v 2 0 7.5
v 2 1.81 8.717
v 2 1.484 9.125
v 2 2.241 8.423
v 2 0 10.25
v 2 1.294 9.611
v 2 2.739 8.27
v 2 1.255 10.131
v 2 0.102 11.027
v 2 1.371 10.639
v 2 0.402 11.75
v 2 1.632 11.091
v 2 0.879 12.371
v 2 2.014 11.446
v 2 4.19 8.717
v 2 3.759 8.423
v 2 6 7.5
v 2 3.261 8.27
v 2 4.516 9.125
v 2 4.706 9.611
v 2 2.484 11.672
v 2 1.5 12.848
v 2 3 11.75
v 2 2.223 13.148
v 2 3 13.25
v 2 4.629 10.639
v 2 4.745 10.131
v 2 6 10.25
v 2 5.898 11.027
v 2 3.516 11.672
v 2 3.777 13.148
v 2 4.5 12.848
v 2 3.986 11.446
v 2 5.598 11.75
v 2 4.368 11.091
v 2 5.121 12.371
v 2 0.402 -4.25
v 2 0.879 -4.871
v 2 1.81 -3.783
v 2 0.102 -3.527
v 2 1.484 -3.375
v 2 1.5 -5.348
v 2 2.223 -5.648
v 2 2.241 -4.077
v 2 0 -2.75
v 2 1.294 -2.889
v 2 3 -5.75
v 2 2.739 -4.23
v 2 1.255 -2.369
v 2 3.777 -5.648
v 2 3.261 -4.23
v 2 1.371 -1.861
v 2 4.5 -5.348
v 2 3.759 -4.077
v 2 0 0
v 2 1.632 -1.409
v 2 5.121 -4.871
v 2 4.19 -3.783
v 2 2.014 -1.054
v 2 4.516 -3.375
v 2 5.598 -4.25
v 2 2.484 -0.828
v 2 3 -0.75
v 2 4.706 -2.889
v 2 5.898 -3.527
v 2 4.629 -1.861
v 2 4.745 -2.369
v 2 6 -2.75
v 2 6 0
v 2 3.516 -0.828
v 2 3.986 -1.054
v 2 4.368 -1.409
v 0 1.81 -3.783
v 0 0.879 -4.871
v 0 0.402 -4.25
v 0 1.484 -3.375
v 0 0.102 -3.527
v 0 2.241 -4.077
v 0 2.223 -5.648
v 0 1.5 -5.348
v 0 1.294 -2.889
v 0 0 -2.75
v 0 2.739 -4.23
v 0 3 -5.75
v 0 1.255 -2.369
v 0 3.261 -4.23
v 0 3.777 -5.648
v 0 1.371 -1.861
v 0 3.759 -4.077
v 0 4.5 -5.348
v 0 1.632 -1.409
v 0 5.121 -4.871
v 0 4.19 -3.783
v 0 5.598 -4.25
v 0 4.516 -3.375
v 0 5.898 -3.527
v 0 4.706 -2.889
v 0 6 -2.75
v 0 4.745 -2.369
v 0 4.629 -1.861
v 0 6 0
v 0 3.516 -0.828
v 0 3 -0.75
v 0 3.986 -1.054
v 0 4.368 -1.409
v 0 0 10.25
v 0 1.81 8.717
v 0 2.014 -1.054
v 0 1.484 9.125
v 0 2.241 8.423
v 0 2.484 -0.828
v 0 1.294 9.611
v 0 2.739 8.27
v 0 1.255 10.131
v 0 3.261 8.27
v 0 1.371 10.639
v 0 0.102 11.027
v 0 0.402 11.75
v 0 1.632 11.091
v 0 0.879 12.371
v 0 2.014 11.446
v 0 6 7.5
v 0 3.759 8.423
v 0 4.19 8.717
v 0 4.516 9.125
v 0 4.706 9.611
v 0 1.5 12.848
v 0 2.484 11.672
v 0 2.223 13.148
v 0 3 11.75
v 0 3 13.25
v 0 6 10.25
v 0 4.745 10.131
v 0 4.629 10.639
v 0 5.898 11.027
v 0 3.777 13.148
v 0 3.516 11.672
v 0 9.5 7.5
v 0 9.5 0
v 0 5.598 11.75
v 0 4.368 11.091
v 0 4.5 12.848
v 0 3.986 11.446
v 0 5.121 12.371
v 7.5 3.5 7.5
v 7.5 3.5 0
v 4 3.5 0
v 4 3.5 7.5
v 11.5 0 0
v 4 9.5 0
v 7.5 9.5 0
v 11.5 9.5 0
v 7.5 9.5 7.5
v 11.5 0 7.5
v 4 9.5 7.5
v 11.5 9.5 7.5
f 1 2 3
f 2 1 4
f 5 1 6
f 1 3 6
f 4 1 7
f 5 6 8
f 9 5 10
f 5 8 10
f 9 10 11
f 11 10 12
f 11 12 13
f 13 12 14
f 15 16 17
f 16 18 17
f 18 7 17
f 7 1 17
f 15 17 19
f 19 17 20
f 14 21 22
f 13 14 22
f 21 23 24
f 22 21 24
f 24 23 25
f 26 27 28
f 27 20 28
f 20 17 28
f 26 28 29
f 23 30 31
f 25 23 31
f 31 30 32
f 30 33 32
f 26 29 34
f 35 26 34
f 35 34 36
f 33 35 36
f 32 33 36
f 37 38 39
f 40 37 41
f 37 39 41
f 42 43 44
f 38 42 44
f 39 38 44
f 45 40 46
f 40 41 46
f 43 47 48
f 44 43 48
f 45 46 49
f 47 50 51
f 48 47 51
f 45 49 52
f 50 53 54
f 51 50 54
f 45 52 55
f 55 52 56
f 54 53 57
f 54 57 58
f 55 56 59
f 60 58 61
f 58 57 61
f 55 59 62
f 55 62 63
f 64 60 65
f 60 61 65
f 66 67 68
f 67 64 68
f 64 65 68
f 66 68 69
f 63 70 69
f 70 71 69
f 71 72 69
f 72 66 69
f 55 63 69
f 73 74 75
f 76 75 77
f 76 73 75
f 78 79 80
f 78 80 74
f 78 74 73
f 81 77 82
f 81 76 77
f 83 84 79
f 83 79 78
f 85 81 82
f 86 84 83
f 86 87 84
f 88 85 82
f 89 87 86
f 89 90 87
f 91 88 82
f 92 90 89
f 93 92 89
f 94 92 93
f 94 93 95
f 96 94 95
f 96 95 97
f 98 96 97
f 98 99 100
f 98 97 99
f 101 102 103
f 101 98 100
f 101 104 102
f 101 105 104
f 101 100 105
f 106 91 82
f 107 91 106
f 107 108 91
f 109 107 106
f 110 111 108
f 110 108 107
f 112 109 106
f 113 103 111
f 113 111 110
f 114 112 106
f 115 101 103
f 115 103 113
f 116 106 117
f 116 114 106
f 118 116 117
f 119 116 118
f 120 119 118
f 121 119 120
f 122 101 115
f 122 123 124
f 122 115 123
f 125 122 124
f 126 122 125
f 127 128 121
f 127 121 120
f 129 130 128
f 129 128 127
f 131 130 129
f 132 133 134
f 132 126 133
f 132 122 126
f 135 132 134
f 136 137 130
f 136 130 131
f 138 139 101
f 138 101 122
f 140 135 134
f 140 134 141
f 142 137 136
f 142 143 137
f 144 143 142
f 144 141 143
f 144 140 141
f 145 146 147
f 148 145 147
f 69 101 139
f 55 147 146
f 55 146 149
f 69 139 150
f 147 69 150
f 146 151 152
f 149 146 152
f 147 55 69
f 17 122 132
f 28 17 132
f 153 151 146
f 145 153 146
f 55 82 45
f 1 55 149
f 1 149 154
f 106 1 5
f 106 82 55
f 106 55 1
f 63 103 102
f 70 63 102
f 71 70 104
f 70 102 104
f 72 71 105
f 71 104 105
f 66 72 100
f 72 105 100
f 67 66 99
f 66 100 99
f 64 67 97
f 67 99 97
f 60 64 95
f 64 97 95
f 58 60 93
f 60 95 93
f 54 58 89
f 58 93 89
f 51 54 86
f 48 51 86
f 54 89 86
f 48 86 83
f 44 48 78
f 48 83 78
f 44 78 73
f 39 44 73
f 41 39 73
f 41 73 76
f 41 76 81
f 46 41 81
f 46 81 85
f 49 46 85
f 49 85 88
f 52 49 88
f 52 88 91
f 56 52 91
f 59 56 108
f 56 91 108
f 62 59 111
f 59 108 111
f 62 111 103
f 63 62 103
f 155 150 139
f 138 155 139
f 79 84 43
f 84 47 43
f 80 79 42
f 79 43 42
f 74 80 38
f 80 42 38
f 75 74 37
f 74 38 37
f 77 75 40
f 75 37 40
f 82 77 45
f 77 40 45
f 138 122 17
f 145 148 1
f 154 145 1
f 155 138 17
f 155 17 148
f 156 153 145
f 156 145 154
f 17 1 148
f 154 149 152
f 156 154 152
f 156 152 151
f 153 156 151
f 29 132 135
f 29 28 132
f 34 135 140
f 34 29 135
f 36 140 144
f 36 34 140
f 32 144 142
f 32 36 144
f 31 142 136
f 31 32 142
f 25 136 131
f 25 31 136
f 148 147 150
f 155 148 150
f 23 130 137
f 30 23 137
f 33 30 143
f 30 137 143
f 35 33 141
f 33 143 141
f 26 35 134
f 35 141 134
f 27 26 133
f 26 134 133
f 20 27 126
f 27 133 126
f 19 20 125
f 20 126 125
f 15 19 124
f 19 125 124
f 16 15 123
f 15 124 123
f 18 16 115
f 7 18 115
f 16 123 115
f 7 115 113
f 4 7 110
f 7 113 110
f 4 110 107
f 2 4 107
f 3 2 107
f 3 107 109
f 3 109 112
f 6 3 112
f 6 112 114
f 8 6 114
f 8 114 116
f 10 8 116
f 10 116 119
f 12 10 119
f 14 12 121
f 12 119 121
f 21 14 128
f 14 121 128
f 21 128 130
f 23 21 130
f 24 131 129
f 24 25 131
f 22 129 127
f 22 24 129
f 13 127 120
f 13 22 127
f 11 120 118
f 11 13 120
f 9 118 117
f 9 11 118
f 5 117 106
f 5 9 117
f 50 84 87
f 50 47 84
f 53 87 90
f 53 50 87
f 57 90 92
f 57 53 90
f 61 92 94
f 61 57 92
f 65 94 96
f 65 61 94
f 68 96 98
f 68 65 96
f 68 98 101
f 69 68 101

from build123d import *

# Parameters (mm, degrees)
BOSS_EXTRUDE2_DEPTH = 7.5
SKETCH3_W           = 19
SKETCH3_H           = 6
SKETCH3_R           = 1.75
BOSS_EXTRUDE3_DEPTH = 2
FILLET1_R           = 3


with BuildPart() as part:
    # Sketch2 → Boss-Extrude2 (new body)
    with BuildSketch(Plane.XY):
        Polygon((0, 9.5), (0, 0), (11.5, 0), (11.5, 9.5), (7.5, 9.5), (7.5, 3.5), (4, 3.5), (4, 9.5), align=None)
    extrude(amount=BOSS_EXTRUDE2_DEPTH)

    # Sketch3 → Boss-Extrude3 (add)
    with BuildSketch(Plane.ZY):
        with Locations((3.75, 3)):
            Rectangle(SKETCH3_W, SKETCH3_H)
        with Locations((-2.5, 3)):
            Circle(SKETCH3_R, mode=Mode.SUBTRACT)
        with Locations((10, 3)):
            Circle(SKETCH3_R, mode=Mode.SUBTRACT)
    extrude(amount=-BOSS_EXTRUDE3_DEPTH)

    # Fillet1
    fillet1_edges = [part.edges().sort_by_distance(p)[0] for p in [
        (1, 0, 13.25),
        (1, 6, 13.25),
        (1, 0, -5.75),
        (1, 6, -5.75),
    ]]
    fillet(fillet1_edges, radius=FILLET1_R - 0.0001)  # a hair under: the kernel refuses the full size


solid = part.part
